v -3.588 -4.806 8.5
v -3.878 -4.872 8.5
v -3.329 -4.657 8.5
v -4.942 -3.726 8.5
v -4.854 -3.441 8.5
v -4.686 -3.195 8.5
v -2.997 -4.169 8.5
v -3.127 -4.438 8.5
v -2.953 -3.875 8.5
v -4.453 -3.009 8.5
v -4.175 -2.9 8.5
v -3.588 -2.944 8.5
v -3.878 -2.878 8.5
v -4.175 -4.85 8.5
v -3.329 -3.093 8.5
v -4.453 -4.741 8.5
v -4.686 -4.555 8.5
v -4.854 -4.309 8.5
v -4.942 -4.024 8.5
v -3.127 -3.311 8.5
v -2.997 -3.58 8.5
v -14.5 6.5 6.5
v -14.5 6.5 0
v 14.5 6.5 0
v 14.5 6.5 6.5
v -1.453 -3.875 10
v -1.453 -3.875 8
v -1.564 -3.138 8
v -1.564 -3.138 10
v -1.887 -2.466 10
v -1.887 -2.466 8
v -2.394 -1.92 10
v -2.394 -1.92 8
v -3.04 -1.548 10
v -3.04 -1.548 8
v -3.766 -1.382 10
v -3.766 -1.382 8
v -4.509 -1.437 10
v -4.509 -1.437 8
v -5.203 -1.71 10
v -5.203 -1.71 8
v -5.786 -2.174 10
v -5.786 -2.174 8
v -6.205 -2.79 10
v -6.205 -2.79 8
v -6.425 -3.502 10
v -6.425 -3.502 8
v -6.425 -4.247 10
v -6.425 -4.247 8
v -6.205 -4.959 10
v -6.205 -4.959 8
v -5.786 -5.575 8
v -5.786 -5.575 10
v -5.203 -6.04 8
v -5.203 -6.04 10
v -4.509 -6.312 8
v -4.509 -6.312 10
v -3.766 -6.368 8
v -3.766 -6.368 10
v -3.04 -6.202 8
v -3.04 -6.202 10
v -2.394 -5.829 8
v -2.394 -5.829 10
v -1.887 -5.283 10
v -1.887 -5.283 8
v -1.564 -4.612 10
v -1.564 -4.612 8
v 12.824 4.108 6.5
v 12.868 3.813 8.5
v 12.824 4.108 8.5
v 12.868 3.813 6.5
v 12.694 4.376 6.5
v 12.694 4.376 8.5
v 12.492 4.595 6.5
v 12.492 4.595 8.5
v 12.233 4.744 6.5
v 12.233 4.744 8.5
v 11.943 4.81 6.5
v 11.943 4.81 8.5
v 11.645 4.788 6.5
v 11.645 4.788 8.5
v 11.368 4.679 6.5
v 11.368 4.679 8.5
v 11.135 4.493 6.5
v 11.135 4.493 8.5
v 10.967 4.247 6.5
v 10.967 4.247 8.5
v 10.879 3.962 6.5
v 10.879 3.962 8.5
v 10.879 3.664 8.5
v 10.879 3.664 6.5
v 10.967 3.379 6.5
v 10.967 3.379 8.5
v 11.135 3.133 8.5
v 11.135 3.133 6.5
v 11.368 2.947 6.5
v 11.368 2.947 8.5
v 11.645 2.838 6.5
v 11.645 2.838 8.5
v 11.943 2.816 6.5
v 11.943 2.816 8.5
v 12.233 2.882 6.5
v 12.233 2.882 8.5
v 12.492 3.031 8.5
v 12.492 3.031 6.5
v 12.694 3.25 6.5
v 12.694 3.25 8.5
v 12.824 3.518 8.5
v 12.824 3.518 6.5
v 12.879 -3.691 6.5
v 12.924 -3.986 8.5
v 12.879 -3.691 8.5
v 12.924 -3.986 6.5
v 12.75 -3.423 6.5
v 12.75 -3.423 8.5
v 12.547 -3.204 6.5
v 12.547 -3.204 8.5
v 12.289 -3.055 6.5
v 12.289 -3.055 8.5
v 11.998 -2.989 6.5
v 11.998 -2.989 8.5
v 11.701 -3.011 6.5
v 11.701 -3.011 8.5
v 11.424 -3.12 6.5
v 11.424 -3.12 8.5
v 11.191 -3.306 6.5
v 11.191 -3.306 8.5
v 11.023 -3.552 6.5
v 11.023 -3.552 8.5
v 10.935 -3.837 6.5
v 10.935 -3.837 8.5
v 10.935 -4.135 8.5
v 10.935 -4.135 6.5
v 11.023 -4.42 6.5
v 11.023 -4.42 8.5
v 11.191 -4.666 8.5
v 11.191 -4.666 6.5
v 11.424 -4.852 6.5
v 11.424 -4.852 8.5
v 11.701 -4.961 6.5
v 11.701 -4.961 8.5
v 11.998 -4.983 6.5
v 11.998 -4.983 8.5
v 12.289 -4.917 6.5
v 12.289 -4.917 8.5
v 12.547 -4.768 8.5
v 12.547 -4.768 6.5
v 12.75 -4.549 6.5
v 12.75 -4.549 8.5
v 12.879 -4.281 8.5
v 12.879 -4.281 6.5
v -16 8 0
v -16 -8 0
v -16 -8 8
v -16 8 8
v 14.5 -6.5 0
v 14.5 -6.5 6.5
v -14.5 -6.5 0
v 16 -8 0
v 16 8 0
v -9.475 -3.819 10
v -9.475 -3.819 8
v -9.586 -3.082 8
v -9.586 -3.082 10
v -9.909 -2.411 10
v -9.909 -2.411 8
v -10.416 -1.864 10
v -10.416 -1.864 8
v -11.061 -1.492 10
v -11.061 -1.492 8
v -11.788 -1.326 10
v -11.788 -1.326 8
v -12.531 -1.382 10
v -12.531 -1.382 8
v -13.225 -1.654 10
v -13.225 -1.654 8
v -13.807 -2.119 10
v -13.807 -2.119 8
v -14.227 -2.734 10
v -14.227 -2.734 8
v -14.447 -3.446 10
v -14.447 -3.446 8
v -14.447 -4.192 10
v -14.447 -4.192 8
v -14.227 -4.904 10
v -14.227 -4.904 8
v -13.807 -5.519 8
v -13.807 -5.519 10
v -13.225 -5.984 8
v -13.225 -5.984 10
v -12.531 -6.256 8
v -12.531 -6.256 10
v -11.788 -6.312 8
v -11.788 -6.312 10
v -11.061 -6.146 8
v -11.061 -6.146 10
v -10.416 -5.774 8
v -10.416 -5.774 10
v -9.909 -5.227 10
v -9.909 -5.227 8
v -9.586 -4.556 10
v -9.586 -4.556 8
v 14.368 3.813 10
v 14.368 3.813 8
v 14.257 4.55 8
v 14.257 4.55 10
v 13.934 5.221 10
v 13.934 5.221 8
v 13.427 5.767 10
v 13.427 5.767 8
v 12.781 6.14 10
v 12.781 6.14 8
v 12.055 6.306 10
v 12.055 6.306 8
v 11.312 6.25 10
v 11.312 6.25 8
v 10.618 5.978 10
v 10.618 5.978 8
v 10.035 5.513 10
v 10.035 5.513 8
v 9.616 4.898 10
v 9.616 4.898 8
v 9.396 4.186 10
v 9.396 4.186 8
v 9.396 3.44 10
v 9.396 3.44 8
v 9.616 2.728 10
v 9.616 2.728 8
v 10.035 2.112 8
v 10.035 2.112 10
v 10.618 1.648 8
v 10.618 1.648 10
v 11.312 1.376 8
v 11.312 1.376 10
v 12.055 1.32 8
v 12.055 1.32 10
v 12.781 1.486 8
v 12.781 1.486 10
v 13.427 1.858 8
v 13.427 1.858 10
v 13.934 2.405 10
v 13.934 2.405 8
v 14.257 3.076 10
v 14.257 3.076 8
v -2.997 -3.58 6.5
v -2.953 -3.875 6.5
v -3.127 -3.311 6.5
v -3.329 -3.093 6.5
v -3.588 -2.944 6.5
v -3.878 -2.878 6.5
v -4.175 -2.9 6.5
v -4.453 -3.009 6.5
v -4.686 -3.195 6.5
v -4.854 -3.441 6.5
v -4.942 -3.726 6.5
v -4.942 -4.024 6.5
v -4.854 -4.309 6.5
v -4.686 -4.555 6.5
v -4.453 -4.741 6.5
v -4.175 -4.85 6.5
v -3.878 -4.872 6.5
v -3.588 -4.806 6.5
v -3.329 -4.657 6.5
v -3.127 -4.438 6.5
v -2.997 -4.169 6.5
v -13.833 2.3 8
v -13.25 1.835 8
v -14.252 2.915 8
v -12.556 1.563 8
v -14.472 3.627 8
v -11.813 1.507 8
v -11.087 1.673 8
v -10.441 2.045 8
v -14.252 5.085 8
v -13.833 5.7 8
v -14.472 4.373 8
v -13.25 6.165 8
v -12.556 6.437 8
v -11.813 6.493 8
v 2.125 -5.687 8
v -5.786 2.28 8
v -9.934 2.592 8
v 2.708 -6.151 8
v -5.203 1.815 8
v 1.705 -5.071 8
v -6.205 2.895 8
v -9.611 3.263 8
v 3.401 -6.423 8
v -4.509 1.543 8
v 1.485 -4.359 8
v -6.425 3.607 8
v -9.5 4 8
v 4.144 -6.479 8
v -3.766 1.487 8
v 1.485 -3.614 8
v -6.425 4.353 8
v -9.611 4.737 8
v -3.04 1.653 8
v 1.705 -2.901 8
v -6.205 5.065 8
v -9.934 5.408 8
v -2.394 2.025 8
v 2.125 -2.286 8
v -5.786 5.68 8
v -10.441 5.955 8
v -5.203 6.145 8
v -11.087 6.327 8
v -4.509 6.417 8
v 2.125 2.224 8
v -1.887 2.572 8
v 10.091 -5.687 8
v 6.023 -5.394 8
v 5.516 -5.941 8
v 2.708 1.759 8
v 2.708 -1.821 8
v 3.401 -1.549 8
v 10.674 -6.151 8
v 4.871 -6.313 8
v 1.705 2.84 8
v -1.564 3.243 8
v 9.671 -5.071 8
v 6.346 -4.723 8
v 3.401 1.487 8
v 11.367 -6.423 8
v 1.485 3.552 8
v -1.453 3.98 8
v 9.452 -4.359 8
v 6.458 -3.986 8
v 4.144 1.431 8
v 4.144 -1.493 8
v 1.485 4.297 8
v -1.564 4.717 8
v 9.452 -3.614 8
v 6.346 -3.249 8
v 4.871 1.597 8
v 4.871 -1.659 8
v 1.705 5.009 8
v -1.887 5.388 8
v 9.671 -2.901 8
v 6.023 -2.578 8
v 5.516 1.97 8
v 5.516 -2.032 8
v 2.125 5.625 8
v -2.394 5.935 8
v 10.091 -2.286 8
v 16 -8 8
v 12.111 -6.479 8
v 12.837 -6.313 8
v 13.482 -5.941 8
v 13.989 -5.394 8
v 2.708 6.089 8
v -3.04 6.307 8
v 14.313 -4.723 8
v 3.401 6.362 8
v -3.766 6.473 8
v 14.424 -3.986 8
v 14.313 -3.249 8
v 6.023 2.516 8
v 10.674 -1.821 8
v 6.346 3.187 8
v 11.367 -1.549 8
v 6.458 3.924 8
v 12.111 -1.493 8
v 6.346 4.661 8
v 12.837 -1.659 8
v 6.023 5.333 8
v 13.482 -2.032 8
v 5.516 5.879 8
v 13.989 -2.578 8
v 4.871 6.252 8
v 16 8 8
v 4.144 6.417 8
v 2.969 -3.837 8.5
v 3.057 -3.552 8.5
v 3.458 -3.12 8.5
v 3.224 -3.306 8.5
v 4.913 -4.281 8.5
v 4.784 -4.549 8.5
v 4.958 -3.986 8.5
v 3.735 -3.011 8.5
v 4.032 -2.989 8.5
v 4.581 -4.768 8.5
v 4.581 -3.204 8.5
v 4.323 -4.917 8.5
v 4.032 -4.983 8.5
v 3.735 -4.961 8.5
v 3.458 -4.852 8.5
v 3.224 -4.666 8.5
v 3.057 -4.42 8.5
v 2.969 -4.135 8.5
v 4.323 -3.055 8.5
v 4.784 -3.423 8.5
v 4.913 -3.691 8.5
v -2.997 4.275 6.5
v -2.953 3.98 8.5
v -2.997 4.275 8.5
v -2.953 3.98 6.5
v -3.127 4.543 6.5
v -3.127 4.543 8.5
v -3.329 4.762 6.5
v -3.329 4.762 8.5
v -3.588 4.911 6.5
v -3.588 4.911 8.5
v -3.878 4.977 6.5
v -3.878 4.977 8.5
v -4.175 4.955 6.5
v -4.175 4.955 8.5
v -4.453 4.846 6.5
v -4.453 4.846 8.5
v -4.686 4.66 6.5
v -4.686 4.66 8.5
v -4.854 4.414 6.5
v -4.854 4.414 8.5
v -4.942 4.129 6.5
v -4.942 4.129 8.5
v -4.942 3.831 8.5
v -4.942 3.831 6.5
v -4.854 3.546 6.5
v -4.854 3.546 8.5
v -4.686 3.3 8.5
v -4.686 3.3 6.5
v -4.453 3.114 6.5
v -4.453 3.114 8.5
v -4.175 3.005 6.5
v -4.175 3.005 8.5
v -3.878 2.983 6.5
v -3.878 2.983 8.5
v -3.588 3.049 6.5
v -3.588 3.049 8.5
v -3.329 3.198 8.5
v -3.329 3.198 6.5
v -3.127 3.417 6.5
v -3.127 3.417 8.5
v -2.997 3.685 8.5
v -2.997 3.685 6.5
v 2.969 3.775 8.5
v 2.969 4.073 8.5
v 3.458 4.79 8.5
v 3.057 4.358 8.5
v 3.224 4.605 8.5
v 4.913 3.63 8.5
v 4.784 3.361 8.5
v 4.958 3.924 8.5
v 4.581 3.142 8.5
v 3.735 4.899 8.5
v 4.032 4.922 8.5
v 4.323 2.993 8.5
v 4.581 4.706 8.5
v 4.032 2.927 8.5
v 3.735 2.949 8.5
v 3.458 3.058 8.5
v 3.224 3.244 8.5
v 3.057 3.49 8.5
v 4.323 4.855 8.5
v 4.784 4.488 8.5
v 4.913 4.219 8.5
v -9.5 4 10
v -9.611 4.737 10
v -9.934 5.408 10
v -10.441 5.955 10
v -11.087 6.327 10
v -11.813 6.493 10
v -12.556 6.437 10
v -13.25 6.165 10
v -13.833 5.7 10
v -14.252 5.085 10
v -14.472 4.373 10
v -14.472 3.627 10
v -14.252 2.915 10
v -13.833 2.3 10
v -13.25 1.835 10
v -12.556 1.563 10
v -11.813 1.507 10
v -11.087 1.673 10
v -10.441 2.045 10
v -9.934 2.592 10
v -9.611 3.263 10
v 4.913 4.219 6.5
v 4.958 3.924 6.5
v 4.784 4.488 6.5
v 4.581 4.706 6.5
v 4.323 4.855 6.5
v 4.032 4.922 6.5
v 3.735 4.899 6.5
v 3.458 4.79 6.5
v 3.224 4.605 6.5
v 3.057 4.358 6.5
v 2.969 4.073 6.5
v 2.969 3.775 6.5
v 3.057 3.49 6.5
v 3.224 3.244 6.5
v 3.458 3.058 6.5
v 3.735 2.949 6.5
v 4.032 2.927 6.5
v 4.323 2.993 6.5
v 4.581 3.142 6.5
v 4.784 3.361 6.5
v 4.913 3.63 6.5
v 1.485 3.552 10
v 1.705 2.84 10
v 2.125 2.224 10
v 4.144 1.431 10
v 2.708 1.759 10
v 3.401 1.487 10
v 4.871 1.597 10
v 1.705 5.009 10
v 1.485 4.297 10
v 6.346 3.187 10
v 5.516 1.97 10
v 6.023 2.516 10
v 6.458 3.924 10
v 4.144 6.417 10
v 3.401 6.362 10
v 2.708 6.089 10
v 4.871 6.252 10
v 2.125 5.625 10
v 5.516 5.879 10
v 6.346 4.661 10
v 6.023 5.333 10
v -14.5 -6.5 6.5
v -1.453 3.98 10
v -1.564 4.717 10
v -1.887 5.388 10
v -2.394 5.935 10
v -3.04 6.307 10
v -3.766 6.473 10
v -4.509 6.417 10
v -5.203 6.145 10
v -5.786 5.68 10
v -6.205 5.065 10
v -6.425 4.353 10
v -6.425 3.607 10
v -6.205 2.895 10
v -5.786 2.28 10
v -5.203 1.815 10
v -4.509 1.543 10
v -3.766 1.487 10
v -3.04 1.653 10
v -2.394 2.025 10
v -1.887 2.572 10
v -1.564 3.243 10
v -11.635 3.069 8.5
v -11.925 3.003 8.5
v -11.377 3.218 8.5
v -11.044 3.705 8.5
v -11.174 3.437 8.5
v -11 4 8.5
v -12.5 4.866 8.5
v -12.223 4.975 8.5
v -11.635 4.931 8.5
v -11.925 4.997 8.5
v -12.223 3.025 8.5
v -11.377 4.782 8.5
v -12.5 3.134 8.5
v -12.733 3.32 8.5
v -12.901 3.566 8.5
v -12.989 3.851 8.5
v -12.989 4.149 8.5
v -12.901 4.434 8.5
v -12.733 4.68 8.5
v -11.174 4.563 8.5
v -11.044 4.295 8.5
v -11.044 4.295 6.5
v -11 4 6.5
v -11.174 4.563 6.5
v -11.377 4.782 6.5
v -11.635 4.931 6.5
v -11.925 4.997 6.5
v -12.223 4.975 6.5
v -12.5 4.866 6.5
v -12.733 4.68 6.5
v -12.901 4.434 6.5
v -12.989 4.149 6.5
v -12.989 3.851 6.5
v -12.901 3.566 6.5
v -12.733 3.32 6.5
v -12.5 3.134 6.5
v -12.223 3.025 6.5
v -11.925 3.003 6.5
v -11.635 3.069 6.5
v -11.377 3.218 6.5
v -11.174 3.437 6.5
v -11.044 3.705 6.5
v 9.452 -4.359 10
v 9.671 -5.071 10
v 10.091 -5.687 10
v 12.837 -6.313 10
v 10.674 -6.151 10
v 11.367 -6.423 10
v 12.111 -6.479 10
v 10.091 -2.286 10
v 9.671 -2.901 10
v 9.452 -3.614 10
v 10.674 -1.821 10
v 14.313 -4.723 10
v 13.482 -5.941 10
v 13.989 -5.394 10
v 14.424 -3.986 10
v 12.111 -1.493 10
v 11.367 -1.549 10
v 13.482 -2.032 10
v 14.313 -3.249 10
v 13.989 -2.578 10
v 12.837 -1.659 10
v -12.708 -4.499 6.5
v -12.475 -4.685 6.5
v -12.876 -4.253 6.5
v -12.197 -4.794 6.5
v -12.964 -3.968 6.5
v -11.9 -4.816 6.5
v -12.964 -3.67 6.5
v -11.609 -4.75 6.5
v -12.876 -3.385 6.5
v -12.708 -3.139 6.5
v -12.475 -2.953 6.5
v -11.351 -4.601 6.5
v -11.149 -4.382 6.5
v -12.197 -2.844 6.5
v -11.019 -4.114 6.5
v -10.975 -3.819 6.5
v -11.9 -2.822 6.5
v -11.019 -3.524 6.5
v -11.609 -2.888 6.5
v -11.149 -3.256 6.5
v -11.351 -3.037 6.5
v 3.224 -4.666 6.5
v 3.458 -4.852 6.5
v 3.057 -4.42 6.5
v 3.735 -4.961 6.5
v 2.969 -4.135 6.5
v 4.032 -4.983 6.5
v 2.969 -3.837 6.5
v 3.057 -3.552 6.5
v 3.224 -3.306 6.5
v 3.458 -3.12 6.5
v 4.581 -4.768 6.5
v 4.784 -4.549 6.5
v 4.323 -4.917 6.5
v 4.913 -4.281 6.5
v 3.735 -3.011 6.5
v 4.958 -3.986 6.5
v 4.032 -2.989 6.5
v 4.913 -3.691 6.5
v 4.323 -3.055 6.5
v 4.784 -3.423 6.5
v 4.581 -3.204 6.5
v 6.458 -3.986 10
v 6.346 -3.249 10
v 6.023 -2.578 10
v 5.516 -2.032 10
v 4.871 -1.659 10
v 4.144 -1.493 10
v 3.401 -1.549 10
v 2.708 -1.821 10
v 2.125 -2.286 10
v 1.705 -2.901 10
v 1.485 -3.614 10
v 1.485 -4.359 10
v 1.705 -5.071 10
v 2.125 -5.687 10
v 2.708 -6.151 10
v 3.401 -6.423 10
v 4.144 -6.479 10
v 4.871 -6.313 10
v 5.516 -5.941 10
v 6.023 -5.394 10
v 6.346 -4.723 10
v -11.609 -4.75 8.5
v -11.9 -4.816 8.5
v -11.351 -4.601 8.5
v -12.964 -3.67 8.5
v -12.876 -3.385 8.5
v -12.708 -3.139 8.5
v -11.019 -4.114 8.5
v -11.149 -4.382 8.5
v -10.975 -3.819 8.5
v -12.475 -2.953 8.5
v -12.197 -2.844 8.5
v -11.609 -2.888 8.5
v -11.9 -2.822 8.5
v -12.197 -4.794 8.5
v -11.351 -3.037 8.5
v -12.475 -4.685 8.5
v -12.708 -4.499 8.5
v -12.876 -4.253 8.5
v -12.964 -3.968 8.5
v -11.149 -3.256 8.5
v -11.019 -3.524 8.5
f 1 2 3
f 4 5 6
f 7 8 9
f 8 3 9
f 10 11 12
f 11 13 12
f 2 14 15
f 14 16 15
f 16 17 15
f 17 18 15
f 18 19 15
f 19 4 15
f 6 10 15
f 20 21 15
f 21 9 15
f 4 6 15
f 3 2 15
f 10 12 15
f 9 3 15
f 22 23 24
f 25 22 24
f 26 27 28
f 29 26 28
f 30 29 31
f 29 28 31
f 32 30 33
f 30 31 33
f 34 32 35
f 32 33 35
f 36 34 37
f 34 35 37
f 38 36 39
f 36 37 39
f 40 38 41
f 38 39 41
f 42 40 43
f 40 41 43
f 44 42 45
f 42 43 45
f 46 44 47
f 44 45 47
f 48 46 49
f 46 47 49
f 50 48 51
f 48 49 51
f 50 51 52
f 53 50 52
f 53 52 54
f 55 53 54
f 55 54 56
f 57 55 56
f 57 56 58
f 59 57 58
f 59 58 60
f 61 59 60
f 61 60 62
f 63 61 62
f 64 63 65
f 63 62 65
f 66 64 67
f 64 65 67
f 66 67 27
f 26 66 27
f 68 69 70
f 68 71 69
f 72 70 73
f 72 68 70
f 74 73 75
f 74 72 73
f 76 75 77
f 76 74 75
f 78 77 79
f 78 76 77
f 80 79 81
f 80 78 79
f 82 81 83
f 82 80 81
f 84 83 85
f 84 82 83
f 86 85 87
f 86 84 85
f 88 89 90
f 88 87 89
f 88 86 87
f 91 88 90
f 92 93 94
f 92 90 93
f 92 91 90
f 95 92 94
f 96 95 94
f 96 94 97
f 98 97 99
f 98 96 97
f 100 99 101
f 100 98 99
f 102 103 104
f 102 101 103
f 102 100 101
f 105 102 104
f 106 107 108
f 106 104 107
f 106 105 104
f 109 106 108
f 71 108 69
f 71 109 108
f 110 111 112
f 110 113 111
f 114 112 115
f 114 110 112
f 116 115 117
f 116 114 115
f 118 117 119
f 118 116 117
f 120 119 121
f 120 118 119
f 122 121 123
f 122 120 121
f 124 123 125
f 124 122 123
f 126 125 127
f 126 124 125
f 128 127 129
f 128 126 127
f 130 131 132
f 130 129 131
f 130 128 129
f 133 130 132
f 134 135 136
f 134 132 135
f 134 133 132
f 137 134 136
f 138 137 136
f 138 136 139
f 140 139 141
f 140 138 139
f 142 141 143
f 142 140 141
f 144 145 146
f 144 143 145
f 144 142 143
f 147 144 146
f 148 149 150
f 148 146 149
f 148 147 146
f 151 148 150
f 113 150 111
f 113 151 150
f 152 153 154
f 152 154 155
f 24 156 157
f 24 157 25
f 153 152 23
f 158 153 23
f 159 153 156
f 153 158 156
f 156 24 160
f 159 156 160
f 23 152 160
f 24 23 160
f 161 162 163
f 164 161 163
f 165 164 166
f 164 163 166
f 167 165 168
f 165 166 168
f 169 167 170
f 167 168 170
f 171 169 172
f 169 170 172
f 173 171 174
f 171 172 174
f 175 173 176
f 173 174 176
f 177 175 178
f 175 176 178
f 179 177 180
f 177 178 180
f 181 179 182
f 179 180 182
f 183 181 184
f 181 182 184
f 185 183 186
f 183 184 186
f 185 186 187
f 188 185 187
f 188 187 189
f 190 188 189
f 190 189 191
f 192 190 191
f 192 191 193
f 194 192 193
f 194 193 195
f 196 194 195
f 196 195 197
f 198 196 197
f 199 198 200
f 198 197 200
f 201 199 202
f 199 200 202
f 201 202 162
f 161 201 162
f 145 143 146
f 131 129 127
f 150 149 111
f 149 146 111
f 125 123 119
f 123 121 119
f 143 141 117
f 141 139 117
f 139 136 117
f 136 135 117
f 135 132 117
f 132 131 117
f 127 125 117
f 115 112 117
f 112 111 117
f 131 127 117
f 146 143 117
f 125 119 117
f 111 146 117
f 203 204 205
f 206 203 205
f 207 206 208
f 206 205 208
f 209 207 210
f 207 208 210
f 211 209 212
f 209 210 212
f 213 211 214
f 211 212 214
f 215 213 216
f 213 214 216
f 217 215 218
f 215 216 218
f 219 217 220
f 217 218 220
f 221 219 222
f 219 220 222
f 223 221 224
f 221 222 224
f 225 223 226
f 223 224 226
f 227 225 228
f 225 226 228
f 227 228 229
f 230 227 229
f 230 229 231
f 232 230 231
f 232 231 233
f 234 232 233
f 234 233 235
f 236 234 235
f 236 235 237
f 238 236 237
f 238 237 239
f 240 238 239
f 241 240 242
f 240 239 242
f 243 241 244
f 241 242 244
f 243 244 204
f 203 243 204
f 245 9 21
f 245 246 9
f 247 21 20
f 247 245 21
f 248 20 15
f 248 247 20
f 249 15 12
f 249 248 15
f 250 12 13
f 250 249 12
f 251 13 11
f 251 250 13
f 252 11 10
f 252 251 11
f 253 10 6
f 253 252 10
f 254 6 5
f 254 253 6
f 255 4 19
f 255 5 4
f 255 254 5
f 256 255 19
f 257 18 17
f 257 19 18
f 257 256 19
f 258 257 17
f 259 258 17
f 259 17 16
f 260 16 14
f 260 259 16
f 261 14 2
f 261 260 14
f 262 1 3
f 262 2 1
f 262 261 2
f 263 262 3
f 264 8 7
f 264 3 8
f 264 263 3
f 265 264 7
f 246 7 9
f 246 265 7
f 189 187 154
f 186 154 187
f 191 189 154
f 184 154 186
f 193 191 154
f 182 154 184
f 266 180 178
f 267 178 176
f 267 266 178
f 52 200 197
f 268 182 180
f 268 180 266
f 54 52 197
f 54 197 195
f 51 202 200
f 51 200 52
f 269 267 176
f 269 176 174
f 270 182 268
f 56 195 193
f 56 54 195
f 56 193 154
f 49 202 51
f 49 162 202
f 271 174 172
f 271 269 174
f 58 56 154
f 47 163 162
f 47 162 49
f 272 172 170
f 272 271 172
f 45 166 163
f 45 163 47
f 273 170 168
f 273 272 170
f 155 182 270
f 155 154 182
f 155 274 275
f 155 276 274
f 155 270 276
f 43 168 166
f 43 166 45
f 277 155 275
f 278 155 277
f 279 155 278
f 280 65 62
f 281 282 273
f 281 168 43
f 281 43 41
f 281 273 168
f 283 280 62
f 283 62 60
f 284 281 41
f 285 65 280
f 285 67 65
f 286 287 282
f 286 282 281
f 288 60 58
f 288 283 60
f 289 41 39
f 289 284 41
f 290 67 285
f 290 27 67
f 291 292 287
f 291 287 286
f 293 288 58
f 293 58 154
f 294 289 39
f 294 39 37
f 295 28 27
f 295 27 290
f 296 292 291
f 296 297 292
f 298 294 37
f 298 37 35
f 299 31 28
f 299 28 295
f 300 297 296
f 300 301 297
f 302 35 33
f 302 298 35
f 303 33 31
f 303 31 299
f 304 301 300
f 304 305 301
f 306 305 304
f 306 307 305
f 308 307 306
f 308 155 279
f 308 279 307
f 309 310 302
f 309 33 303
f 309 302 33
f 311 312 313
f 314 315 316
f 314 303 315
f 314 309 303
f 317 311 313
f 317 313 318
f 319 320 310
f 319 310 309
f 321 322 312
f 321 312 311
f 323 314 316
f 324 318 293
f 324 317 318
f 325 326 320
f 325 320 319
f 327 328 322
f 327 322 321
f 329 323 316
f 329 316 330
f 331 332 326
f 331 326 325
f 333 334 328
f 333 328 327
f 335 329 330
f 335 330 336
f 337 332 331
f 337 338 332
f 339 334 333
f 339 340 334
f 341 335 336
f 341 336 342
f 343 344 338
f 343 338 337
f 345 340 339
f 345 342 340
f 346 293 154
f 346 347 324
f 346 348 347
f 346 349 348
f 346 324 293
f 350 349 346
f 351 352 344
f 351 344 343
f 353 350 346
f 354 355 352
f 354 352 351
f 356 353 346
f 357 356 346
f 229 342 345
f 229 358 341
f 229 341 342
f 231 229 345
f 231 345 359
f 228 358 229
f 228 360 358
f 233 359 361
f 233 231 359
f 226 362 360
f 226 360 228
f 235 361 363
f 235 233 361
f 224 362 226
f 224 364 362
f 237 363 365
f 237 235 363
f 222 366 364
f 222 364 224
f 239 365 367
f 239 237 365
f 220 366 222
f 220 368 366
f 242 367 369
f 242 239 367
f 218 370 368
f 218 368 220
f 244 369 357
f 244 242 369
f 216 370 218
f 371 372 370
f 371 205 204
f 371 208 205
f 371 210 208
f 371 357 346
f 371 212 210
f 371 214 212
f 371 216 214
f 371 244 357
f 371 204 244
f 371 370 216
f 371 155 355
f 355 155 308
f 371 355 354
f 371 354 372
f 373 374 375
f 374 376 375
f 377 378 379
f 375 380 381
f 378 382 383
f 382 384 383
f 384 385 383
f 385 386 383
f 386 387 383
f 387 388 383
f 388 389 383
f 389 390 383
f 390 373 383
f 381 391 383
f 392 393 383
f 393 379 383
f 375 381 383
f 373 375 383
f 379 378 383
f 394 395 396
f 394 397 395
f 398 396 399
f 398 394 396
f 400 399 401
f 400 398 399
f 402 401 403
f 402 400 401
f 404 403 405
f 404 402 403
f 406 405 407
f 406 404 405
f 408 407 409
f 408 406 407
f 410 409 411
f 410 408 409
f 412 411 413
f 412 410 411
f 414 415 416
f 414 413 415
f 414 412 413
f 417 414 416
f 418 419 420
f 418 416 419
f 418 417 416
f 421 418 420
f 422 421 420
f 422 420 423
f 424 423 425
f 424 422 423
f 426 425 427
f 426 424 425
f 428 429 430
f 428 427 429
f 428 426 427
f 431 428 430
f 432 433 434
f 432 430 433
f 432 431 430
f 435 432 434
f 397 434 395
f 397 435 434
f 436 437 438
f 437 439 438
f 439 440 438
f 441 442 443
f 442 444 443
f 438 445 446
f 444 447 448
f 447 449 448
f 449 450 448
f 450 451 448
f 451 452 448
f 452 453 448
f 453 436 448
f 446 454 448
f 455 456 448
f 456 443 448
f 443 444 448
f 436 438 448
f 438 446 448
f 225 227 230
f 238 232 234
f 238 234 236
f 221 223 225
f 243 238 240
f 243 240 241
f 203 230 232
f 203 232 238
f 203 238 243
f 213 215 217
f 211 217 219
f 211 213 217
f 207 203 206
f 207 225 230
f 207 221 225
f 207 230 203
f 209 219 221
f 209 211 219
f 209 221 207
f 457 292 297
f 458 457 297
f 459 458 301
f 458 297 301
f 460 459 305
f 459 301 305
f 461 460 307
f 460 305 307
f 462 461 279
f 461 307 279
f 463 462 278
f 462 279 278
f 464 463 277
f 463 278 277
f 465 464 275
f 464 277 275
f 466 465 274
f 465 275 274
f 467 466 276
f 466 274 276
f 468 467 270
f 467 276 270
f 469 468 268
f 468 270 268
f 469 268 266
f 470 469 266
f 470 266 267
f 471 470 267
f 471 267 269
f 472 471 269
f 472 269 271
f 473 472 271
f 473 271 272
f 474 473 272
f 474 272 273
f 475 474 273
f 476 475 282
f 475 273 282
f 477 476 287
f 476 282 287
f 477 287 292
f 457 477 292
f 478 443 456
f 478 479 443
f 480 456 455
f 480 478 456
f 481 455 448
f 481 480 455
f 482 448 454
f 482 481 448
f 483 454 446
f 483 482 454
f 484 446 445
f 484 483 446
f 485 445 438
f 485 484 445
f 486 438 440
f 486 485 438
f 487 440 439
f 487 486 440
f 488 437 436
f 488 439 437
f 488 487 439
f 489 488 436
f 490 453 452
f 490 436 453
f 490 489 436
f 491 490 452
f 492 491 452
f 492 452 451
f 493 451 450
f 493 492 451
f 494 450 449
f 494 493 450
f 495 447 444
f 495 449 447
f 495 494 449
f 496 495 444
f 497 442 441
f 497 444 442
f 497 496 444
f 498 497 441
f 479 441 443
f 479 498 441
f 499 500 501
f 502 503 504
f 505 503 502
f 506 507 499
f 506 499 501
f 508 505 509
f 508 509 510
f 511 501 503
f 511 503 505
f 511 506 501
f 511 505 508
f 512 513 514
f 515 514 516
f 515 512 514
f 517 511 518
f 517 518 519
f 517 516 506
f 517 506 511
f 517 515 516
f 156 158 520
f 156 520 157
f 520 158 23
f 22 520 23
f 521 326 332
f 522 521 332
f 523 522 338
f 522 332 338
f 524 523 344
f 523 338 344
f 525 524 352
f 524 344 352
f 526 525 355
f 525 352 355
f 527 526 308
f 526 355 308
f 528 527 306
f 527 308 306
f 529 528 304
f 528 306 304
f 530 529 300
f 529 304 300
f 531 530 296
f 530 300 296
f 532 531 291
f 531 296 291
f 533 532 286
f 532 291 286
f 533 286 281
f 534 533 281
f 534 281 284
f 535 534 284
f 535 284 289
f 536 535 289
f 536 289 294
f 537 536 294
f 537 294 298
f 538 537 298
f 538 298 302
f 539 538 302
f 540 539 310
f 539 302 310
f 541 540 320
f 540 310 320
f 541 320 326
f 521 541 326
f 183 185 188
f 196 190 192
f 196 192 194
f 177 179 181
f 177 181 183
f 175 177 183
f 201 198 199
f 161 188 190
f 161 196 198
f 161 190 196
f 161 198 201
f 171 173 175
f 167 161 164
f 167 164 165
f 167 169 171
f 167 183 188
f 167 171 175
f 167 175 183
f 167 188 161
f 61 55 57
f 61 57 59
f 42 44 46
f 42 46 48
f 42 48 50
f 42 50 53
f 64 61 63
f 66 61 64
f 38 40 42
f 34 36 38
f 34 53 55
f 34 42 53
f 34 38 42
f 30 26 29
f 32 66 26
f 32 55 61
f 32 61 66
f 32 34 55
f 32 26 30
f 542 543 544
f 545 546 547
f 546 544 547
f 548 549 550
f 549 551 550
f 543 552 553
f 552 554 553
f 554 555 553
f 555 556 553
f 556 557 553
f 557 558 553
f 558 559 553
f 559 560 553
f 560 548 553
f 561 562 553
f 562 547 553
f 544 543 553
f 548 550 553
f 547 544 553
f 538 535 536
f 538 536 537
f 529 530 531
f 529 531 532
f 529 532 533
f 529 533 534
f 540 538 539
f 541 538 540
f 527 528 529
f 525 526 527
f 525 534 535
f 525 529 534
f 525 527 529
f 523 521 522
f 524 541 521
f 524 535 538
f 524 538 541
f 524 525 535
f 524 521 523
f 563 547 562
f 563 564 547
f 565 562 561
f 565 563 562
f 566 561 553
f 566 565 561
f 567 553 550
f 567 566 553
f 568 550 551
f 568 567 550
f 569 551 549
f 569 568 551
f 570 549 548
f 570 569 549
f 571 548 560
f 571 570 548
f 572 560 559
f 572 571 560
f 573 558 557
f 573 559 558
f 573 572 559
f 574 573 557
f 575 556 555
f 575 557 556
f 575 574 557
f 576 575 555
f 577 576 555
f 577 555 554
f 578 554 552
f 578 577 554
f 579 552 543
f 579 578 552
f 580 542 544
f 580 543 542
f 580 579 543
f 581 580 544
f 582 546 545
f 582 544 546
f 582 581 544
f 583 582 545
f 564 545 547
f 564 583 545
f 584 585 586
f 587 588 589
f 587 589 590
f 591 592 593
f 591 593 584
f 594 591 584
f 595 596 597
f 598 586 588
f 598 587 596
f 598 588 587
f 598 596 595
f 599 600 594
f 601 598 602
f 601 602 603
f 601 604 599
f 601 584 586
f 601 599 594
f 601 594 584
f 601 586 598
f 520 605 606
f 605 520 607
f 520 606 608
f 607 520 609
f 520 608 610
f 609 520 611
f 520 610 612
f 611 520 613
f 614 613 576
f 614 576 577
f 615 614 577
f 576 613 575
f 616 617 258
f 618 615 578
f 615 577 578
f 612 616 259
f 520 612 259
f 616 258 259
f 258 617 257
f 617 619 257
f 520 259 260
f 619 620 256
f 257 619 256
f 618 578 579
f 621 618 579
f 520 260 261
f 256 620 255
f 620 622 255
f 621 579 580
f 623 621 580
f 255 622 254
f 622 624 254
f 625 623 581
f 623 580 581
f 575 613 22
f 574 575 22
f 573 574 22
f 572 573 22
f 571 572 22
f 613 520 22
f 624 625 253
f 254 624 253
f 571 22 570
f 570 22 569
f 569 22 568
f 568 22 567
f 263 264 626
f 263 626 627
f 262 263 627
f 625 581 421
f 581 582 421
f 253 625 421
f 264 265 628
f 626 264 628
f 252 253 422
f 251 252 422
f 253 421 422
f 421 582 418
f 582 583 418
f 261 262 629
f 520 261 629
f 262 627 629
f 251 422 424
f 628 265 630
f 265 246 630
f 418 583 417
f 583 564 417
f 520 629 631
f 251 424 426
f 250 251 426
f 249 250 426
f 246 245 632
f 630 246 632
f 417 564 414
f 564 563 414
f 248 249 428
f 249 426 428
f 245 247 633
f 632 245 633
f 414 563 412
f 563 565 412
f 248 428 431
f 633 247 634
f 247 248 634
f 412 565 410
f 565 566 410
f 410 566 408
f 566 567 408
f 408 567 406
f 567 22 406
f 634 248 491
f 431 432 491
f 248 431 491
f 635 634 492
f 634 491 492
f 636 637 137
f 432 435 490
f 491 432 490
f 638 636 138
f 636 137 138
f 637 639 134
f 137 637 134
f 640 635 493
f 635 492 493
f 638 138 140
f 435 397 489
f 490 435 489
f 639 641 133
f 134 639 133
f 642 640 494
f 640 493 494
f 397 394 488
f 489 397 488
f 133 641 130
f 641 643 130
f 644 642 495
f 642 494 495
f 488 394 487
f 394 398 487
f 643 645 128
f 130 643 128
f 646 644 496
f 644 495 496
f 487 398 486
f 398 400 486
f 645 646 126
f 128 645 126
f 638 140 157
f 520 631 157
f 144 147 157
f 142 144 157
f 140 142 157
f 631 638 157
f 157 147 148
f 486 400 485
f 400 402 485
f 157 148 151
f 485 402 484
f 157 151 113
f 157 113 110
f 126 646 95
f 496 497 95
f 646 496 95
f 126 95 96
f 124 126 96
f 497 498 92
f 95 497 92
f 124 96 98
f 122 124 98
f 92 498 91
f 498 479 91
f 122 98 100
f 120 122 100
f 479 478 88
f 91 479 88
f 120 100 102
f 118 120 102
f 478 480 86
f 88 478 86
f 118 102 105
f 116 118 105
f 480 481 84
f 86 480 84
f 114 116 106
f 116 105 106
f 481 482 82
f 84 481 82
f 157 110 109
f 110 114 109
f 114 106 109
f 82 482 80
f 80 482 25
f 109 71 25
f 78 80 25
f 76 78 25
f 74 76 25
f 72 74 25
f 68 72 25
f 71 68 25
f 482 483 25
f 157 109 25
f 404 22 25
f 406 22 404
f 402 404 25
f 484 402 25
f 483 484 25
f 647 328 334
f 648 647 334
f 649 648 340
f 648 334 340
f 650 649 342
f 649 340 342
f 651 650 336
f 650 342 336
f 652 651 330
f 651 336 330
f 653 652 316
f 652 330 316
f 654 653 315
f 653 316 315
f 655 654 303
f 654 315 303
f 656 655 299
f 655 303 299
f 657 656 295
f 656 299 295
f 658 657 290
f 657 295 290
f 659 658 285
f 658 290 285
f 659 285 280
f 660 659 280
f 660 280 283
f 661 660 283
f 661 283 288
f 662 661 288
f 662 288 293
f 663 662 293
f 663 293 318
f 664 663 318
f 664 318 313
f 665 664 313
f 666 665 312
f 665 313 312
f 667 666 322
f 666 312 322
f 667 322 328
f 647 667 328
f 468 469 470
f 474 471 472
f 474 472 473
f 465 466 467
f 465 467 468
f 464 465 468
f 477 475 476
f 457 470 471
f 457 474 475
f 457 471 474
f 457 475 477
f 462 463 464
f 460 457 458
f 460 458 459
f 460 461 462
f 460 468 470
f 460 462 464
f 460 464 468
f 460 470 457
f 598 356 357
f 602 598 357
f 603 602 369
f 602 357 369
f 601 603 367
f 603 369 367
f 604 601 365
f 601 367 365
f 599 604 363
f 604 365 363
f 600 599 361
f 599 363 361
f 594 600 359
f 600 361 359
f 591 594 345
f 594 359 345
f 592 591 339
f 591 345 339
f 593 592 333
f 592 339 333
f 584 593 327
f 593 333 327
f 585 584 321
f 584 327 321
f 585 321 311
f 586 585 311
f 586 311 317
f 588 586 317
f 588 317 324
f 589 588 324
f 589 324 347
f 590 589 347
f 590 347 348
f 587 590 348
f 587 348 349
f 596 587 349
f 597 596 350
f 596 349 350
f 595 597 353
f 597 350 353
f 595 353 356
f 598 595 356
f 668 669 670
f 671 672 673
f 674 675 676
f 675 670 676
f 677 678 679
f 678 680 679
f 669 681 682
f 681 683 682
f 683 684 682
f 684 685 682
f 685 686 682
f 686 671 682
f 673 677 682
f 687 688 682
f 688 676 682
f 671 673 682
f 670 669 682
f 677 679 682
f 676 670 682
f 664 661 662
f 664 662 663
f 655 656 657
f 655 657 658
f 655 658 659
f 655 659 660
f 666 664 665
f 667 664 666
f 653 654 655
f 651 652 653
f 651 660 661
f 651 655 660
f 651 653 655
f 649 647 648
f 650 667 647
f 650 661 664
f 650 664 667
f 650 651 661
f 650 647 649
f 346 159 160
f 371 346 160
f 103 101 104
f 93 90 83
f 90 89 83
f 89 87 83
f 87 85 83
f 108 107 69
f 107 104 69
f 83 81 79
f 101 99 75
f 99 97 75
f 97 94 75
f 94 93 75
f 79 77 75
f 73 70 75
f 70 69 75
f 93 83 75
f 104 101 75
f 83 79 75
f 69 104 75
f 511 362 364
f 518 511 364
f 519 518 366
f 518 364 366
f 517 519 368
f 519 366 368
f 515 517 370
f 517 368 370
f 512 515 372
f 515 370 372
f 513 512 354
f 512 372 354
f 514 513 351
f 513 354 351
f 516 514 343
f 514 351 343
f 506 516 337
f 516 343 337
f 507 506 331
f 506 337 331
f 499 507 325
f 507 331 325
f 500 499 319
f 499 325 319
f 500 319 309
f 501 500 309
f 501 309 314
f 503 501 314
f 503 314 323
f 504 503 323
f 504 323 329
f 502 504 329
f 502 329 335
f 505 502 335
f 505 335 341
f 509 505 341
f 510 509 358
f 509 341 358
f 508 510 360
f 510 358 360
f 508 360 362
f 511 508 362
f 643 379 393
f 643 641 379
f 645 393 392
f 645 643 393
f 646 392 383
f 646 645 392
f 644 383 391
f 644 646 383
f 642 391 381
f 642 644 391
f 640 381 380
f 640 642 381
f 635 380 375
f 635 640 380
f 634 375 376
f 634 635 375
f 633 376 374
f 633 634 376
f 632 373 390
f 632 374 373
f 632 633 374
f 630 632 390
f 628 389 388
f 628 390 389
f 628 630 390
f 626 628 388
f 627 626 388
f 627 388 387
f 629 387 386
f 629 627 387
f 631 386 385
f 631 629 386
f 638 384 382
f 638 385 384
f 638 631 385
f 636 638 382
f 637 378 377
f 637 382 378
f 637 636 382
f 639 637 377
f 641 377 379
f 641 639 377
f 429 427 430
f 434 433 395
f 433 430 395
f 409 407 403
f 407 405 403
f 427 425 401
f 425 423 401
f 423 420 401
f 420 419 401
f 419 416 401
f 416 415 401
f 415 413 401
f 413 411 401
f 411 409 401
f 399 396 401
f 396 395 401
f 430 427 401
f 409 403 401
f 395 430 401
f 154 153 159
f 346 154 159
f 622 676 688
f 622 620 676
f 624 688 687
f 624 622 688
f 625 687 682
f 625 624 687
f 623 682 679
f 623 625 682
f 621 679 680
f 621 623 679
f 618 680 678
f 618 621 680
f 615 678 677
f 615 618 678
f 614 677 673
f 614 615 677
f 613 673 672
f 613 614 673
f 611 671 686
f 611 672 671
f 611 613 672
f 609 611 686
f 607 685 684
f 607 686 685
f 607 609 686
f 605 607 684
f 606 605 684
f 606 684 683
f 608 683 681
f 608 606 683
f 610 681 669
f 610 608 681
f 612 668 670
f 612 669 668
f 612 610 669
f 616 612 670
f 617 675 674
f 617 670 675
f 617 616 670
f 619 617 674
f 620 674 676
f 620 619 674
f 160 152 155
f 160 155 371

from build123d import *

# Parameters (mm, degrees)
F0_W     = 32
F0_H     = 16
F1_DEPTH = 8
F2_R     = 2.5
F3_DEPTH = 2
F4_T     = -1.5


with BuildPart() as f1:
    # F0 (on Top) → F1 (new body)
    with BuildSketch(Plane.XY):
        Rectangle(F0_W, F0_H)
    extrude(amount=F1_DEPTH)

    # F2 (on face) → F3 (join)
    with BuildSketch(Plane.XY.offset(8)):
        with Locations((-12, 4)):
            Circle(F2_R)
        with Locations((-3.9529362693, 3.9800377563)):
            Circle(F2_R)
        with Locations((3.9575416595, 3.9243297651)):
            Circle(F2_R)
        with Locations((11.8680195883, 3.8129147142)):
            Circle(F2_R)
        with Locations((-11.9748292491, -3.8190248888)):
            Circle(F2_R)
        with Locations((-3.9529362693, -3.8747326471)):
            Circle(F2_R)
        with Locations((3.9575416595, -3.9861481637)):
            Circle(F2_R)
        with Locations((11.9237266481, -3.9861481637)):
            Circle(F2_R)
    extrude(amount=F3_DEPTH)

    # F4
    f4_openings = [f1.faces().sort_by_distance(p)[0] for p in [
        (0, 0, 0),
    ]]
    offset(amount=F4_T, openings=f4_openings, kind=Kind.INTERSECTION)


solid = f1.part
